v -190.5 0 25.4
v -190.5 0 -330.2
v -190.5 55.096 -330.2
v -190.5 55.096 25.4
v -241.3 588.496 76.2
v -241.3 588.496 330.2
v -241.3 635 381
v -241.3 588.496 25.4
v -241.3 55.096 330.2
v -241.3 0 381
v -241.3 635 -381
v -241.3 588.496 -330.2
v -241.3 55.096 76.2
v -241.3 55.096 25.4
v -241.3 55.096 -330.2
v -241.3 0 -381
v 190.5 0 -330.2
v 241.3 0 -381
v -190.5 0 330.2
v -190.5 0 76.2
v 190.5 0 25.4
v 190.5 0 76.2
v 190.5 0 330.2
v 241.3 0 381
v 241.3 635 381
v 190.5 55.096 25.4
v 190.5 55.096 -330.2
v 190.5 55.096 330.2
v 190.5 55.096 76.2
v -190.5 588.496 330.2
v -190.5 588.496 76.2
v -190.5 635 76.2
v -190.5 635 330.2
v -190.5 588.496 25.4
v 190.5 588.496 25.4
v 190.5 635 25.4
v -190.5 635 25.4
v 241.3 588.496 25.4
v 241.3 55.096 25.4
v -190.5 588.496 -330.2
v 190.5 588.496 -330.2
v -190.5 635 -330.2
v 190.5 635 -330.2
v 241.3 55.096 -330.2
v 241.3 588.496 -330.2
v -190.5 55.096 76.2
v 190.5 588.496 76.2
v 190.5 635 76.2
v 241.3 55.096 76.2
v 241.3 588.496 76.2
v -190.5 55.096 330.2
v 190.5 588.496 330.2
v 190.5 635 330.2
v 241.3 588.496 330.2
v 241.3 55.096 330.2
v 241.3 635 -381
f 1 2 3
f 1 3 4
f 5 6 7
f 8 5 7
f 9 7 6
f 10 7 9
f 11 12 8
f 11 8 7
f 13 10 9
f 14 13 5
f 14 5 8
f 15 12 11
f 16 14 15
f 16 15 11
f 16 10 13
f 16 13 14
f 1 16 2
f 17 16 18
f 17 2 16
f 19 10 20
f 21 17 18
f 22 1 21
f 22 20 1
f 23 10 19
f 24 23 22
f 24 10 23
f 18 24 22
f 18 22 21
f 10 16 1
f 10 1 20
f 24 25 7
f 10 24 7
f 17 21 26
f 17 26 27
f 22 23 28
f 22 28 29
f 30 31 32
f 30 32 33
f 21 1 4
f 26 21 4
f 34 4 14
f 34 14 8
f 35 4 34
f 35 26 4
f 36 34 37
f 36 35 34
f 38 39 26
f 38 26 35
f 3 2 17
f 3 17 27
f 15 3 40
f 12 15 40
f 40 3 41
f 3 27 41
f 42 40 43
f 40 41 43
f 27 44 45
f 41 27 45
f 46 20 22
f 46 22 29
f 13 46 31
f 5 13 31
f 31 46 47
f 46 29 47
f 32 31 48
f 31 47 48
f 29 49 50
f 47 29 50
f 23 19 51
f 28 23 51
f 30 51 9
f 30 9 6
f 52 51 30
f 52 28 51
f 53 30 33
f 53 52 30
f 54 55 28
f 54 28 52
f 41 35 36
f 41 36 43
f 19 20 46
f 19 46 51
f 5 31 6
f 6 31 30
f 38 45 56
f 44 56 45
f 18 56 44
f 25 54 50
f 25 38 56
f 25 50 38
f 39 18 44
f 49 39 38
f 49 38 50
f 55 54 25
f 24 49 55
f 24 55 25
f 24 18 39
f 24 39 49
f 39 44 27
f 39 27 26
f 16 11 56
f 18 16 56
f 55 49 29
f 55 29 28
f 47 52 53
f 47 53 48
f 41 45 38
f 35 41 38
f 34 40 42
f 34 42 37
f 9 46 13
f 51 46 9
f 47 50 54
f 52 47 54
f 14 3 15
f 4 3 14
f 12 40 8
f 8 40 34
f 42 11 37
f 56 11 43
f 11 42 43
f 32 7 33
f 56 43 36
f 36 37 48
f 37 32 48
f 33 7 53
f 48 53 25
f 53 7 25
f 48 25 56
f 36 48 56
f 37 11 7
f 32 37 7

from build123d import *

# Parameters (mm, degrees)
F0_W     = 381
F0_H     = 50.8
F0_W_2   = 50.8
F1_DEPTH = 635
F2_W     = 533.4
F2_H     = 254
F2_H_2   = 355.6
F3_DEPTH = 482.601


with BuildPart() as f1:
    # F0 (on Front) → F1 (new body)
    with BuildSketch(Plane.XZ):
        with Locations((0, 355.6)):
            Rectangle(F0_W, F0_H)
        Polygon((241.3, 381), (190.5, 381), (190.5, 330.2), (190.5, 76.2), (241.3, 76.2), align=None)
        Polygon((241.3, 25.4), (190.5, 25.4), (190.5, -330.2), (190.5, -381), (241.3, -381), align=None)
        with Locations((0, -355.6)):
            Rectangle(F0_W, F0_H)
        Polygon((-190.5, 381), (-241.3, 381), (-241.3, 76.2), (-190.5, 76.2), (-190.5, 330.2), align=None)
        Polygon((-190.5, 25.4), (-241.3, 25.4), (-241.3, -381), (-190.5, -381), (-190.5, -330.2), align=None)
        with Locations((0, 50.8)):
            Rectangle(F0_W, F0_H)
        with Locations((-215.9, 50.8)):
            Rectangle(F0_W_2, F0_H)
        with Locations((215.9, 50.8)):
            Rectangle(F0_W_2, F0_H)
    extrude(amount=-F1_DEPTH)

    # F2 (on face) → F3 (cut, through all)
    with BuildSketch(Plane.YZ.offset(241.3)):
        with Locations((321.7956796288, 203.2)):
            Rectangle(F2_W, F2_H)
        with Locations((321.7956796288, -152.4)):
            Rectangle(F2_W, F2_H_2)
    extrude(amount=-F3_DEPTH, mode=Mode.SUBTRACT)


solid = f1.part
